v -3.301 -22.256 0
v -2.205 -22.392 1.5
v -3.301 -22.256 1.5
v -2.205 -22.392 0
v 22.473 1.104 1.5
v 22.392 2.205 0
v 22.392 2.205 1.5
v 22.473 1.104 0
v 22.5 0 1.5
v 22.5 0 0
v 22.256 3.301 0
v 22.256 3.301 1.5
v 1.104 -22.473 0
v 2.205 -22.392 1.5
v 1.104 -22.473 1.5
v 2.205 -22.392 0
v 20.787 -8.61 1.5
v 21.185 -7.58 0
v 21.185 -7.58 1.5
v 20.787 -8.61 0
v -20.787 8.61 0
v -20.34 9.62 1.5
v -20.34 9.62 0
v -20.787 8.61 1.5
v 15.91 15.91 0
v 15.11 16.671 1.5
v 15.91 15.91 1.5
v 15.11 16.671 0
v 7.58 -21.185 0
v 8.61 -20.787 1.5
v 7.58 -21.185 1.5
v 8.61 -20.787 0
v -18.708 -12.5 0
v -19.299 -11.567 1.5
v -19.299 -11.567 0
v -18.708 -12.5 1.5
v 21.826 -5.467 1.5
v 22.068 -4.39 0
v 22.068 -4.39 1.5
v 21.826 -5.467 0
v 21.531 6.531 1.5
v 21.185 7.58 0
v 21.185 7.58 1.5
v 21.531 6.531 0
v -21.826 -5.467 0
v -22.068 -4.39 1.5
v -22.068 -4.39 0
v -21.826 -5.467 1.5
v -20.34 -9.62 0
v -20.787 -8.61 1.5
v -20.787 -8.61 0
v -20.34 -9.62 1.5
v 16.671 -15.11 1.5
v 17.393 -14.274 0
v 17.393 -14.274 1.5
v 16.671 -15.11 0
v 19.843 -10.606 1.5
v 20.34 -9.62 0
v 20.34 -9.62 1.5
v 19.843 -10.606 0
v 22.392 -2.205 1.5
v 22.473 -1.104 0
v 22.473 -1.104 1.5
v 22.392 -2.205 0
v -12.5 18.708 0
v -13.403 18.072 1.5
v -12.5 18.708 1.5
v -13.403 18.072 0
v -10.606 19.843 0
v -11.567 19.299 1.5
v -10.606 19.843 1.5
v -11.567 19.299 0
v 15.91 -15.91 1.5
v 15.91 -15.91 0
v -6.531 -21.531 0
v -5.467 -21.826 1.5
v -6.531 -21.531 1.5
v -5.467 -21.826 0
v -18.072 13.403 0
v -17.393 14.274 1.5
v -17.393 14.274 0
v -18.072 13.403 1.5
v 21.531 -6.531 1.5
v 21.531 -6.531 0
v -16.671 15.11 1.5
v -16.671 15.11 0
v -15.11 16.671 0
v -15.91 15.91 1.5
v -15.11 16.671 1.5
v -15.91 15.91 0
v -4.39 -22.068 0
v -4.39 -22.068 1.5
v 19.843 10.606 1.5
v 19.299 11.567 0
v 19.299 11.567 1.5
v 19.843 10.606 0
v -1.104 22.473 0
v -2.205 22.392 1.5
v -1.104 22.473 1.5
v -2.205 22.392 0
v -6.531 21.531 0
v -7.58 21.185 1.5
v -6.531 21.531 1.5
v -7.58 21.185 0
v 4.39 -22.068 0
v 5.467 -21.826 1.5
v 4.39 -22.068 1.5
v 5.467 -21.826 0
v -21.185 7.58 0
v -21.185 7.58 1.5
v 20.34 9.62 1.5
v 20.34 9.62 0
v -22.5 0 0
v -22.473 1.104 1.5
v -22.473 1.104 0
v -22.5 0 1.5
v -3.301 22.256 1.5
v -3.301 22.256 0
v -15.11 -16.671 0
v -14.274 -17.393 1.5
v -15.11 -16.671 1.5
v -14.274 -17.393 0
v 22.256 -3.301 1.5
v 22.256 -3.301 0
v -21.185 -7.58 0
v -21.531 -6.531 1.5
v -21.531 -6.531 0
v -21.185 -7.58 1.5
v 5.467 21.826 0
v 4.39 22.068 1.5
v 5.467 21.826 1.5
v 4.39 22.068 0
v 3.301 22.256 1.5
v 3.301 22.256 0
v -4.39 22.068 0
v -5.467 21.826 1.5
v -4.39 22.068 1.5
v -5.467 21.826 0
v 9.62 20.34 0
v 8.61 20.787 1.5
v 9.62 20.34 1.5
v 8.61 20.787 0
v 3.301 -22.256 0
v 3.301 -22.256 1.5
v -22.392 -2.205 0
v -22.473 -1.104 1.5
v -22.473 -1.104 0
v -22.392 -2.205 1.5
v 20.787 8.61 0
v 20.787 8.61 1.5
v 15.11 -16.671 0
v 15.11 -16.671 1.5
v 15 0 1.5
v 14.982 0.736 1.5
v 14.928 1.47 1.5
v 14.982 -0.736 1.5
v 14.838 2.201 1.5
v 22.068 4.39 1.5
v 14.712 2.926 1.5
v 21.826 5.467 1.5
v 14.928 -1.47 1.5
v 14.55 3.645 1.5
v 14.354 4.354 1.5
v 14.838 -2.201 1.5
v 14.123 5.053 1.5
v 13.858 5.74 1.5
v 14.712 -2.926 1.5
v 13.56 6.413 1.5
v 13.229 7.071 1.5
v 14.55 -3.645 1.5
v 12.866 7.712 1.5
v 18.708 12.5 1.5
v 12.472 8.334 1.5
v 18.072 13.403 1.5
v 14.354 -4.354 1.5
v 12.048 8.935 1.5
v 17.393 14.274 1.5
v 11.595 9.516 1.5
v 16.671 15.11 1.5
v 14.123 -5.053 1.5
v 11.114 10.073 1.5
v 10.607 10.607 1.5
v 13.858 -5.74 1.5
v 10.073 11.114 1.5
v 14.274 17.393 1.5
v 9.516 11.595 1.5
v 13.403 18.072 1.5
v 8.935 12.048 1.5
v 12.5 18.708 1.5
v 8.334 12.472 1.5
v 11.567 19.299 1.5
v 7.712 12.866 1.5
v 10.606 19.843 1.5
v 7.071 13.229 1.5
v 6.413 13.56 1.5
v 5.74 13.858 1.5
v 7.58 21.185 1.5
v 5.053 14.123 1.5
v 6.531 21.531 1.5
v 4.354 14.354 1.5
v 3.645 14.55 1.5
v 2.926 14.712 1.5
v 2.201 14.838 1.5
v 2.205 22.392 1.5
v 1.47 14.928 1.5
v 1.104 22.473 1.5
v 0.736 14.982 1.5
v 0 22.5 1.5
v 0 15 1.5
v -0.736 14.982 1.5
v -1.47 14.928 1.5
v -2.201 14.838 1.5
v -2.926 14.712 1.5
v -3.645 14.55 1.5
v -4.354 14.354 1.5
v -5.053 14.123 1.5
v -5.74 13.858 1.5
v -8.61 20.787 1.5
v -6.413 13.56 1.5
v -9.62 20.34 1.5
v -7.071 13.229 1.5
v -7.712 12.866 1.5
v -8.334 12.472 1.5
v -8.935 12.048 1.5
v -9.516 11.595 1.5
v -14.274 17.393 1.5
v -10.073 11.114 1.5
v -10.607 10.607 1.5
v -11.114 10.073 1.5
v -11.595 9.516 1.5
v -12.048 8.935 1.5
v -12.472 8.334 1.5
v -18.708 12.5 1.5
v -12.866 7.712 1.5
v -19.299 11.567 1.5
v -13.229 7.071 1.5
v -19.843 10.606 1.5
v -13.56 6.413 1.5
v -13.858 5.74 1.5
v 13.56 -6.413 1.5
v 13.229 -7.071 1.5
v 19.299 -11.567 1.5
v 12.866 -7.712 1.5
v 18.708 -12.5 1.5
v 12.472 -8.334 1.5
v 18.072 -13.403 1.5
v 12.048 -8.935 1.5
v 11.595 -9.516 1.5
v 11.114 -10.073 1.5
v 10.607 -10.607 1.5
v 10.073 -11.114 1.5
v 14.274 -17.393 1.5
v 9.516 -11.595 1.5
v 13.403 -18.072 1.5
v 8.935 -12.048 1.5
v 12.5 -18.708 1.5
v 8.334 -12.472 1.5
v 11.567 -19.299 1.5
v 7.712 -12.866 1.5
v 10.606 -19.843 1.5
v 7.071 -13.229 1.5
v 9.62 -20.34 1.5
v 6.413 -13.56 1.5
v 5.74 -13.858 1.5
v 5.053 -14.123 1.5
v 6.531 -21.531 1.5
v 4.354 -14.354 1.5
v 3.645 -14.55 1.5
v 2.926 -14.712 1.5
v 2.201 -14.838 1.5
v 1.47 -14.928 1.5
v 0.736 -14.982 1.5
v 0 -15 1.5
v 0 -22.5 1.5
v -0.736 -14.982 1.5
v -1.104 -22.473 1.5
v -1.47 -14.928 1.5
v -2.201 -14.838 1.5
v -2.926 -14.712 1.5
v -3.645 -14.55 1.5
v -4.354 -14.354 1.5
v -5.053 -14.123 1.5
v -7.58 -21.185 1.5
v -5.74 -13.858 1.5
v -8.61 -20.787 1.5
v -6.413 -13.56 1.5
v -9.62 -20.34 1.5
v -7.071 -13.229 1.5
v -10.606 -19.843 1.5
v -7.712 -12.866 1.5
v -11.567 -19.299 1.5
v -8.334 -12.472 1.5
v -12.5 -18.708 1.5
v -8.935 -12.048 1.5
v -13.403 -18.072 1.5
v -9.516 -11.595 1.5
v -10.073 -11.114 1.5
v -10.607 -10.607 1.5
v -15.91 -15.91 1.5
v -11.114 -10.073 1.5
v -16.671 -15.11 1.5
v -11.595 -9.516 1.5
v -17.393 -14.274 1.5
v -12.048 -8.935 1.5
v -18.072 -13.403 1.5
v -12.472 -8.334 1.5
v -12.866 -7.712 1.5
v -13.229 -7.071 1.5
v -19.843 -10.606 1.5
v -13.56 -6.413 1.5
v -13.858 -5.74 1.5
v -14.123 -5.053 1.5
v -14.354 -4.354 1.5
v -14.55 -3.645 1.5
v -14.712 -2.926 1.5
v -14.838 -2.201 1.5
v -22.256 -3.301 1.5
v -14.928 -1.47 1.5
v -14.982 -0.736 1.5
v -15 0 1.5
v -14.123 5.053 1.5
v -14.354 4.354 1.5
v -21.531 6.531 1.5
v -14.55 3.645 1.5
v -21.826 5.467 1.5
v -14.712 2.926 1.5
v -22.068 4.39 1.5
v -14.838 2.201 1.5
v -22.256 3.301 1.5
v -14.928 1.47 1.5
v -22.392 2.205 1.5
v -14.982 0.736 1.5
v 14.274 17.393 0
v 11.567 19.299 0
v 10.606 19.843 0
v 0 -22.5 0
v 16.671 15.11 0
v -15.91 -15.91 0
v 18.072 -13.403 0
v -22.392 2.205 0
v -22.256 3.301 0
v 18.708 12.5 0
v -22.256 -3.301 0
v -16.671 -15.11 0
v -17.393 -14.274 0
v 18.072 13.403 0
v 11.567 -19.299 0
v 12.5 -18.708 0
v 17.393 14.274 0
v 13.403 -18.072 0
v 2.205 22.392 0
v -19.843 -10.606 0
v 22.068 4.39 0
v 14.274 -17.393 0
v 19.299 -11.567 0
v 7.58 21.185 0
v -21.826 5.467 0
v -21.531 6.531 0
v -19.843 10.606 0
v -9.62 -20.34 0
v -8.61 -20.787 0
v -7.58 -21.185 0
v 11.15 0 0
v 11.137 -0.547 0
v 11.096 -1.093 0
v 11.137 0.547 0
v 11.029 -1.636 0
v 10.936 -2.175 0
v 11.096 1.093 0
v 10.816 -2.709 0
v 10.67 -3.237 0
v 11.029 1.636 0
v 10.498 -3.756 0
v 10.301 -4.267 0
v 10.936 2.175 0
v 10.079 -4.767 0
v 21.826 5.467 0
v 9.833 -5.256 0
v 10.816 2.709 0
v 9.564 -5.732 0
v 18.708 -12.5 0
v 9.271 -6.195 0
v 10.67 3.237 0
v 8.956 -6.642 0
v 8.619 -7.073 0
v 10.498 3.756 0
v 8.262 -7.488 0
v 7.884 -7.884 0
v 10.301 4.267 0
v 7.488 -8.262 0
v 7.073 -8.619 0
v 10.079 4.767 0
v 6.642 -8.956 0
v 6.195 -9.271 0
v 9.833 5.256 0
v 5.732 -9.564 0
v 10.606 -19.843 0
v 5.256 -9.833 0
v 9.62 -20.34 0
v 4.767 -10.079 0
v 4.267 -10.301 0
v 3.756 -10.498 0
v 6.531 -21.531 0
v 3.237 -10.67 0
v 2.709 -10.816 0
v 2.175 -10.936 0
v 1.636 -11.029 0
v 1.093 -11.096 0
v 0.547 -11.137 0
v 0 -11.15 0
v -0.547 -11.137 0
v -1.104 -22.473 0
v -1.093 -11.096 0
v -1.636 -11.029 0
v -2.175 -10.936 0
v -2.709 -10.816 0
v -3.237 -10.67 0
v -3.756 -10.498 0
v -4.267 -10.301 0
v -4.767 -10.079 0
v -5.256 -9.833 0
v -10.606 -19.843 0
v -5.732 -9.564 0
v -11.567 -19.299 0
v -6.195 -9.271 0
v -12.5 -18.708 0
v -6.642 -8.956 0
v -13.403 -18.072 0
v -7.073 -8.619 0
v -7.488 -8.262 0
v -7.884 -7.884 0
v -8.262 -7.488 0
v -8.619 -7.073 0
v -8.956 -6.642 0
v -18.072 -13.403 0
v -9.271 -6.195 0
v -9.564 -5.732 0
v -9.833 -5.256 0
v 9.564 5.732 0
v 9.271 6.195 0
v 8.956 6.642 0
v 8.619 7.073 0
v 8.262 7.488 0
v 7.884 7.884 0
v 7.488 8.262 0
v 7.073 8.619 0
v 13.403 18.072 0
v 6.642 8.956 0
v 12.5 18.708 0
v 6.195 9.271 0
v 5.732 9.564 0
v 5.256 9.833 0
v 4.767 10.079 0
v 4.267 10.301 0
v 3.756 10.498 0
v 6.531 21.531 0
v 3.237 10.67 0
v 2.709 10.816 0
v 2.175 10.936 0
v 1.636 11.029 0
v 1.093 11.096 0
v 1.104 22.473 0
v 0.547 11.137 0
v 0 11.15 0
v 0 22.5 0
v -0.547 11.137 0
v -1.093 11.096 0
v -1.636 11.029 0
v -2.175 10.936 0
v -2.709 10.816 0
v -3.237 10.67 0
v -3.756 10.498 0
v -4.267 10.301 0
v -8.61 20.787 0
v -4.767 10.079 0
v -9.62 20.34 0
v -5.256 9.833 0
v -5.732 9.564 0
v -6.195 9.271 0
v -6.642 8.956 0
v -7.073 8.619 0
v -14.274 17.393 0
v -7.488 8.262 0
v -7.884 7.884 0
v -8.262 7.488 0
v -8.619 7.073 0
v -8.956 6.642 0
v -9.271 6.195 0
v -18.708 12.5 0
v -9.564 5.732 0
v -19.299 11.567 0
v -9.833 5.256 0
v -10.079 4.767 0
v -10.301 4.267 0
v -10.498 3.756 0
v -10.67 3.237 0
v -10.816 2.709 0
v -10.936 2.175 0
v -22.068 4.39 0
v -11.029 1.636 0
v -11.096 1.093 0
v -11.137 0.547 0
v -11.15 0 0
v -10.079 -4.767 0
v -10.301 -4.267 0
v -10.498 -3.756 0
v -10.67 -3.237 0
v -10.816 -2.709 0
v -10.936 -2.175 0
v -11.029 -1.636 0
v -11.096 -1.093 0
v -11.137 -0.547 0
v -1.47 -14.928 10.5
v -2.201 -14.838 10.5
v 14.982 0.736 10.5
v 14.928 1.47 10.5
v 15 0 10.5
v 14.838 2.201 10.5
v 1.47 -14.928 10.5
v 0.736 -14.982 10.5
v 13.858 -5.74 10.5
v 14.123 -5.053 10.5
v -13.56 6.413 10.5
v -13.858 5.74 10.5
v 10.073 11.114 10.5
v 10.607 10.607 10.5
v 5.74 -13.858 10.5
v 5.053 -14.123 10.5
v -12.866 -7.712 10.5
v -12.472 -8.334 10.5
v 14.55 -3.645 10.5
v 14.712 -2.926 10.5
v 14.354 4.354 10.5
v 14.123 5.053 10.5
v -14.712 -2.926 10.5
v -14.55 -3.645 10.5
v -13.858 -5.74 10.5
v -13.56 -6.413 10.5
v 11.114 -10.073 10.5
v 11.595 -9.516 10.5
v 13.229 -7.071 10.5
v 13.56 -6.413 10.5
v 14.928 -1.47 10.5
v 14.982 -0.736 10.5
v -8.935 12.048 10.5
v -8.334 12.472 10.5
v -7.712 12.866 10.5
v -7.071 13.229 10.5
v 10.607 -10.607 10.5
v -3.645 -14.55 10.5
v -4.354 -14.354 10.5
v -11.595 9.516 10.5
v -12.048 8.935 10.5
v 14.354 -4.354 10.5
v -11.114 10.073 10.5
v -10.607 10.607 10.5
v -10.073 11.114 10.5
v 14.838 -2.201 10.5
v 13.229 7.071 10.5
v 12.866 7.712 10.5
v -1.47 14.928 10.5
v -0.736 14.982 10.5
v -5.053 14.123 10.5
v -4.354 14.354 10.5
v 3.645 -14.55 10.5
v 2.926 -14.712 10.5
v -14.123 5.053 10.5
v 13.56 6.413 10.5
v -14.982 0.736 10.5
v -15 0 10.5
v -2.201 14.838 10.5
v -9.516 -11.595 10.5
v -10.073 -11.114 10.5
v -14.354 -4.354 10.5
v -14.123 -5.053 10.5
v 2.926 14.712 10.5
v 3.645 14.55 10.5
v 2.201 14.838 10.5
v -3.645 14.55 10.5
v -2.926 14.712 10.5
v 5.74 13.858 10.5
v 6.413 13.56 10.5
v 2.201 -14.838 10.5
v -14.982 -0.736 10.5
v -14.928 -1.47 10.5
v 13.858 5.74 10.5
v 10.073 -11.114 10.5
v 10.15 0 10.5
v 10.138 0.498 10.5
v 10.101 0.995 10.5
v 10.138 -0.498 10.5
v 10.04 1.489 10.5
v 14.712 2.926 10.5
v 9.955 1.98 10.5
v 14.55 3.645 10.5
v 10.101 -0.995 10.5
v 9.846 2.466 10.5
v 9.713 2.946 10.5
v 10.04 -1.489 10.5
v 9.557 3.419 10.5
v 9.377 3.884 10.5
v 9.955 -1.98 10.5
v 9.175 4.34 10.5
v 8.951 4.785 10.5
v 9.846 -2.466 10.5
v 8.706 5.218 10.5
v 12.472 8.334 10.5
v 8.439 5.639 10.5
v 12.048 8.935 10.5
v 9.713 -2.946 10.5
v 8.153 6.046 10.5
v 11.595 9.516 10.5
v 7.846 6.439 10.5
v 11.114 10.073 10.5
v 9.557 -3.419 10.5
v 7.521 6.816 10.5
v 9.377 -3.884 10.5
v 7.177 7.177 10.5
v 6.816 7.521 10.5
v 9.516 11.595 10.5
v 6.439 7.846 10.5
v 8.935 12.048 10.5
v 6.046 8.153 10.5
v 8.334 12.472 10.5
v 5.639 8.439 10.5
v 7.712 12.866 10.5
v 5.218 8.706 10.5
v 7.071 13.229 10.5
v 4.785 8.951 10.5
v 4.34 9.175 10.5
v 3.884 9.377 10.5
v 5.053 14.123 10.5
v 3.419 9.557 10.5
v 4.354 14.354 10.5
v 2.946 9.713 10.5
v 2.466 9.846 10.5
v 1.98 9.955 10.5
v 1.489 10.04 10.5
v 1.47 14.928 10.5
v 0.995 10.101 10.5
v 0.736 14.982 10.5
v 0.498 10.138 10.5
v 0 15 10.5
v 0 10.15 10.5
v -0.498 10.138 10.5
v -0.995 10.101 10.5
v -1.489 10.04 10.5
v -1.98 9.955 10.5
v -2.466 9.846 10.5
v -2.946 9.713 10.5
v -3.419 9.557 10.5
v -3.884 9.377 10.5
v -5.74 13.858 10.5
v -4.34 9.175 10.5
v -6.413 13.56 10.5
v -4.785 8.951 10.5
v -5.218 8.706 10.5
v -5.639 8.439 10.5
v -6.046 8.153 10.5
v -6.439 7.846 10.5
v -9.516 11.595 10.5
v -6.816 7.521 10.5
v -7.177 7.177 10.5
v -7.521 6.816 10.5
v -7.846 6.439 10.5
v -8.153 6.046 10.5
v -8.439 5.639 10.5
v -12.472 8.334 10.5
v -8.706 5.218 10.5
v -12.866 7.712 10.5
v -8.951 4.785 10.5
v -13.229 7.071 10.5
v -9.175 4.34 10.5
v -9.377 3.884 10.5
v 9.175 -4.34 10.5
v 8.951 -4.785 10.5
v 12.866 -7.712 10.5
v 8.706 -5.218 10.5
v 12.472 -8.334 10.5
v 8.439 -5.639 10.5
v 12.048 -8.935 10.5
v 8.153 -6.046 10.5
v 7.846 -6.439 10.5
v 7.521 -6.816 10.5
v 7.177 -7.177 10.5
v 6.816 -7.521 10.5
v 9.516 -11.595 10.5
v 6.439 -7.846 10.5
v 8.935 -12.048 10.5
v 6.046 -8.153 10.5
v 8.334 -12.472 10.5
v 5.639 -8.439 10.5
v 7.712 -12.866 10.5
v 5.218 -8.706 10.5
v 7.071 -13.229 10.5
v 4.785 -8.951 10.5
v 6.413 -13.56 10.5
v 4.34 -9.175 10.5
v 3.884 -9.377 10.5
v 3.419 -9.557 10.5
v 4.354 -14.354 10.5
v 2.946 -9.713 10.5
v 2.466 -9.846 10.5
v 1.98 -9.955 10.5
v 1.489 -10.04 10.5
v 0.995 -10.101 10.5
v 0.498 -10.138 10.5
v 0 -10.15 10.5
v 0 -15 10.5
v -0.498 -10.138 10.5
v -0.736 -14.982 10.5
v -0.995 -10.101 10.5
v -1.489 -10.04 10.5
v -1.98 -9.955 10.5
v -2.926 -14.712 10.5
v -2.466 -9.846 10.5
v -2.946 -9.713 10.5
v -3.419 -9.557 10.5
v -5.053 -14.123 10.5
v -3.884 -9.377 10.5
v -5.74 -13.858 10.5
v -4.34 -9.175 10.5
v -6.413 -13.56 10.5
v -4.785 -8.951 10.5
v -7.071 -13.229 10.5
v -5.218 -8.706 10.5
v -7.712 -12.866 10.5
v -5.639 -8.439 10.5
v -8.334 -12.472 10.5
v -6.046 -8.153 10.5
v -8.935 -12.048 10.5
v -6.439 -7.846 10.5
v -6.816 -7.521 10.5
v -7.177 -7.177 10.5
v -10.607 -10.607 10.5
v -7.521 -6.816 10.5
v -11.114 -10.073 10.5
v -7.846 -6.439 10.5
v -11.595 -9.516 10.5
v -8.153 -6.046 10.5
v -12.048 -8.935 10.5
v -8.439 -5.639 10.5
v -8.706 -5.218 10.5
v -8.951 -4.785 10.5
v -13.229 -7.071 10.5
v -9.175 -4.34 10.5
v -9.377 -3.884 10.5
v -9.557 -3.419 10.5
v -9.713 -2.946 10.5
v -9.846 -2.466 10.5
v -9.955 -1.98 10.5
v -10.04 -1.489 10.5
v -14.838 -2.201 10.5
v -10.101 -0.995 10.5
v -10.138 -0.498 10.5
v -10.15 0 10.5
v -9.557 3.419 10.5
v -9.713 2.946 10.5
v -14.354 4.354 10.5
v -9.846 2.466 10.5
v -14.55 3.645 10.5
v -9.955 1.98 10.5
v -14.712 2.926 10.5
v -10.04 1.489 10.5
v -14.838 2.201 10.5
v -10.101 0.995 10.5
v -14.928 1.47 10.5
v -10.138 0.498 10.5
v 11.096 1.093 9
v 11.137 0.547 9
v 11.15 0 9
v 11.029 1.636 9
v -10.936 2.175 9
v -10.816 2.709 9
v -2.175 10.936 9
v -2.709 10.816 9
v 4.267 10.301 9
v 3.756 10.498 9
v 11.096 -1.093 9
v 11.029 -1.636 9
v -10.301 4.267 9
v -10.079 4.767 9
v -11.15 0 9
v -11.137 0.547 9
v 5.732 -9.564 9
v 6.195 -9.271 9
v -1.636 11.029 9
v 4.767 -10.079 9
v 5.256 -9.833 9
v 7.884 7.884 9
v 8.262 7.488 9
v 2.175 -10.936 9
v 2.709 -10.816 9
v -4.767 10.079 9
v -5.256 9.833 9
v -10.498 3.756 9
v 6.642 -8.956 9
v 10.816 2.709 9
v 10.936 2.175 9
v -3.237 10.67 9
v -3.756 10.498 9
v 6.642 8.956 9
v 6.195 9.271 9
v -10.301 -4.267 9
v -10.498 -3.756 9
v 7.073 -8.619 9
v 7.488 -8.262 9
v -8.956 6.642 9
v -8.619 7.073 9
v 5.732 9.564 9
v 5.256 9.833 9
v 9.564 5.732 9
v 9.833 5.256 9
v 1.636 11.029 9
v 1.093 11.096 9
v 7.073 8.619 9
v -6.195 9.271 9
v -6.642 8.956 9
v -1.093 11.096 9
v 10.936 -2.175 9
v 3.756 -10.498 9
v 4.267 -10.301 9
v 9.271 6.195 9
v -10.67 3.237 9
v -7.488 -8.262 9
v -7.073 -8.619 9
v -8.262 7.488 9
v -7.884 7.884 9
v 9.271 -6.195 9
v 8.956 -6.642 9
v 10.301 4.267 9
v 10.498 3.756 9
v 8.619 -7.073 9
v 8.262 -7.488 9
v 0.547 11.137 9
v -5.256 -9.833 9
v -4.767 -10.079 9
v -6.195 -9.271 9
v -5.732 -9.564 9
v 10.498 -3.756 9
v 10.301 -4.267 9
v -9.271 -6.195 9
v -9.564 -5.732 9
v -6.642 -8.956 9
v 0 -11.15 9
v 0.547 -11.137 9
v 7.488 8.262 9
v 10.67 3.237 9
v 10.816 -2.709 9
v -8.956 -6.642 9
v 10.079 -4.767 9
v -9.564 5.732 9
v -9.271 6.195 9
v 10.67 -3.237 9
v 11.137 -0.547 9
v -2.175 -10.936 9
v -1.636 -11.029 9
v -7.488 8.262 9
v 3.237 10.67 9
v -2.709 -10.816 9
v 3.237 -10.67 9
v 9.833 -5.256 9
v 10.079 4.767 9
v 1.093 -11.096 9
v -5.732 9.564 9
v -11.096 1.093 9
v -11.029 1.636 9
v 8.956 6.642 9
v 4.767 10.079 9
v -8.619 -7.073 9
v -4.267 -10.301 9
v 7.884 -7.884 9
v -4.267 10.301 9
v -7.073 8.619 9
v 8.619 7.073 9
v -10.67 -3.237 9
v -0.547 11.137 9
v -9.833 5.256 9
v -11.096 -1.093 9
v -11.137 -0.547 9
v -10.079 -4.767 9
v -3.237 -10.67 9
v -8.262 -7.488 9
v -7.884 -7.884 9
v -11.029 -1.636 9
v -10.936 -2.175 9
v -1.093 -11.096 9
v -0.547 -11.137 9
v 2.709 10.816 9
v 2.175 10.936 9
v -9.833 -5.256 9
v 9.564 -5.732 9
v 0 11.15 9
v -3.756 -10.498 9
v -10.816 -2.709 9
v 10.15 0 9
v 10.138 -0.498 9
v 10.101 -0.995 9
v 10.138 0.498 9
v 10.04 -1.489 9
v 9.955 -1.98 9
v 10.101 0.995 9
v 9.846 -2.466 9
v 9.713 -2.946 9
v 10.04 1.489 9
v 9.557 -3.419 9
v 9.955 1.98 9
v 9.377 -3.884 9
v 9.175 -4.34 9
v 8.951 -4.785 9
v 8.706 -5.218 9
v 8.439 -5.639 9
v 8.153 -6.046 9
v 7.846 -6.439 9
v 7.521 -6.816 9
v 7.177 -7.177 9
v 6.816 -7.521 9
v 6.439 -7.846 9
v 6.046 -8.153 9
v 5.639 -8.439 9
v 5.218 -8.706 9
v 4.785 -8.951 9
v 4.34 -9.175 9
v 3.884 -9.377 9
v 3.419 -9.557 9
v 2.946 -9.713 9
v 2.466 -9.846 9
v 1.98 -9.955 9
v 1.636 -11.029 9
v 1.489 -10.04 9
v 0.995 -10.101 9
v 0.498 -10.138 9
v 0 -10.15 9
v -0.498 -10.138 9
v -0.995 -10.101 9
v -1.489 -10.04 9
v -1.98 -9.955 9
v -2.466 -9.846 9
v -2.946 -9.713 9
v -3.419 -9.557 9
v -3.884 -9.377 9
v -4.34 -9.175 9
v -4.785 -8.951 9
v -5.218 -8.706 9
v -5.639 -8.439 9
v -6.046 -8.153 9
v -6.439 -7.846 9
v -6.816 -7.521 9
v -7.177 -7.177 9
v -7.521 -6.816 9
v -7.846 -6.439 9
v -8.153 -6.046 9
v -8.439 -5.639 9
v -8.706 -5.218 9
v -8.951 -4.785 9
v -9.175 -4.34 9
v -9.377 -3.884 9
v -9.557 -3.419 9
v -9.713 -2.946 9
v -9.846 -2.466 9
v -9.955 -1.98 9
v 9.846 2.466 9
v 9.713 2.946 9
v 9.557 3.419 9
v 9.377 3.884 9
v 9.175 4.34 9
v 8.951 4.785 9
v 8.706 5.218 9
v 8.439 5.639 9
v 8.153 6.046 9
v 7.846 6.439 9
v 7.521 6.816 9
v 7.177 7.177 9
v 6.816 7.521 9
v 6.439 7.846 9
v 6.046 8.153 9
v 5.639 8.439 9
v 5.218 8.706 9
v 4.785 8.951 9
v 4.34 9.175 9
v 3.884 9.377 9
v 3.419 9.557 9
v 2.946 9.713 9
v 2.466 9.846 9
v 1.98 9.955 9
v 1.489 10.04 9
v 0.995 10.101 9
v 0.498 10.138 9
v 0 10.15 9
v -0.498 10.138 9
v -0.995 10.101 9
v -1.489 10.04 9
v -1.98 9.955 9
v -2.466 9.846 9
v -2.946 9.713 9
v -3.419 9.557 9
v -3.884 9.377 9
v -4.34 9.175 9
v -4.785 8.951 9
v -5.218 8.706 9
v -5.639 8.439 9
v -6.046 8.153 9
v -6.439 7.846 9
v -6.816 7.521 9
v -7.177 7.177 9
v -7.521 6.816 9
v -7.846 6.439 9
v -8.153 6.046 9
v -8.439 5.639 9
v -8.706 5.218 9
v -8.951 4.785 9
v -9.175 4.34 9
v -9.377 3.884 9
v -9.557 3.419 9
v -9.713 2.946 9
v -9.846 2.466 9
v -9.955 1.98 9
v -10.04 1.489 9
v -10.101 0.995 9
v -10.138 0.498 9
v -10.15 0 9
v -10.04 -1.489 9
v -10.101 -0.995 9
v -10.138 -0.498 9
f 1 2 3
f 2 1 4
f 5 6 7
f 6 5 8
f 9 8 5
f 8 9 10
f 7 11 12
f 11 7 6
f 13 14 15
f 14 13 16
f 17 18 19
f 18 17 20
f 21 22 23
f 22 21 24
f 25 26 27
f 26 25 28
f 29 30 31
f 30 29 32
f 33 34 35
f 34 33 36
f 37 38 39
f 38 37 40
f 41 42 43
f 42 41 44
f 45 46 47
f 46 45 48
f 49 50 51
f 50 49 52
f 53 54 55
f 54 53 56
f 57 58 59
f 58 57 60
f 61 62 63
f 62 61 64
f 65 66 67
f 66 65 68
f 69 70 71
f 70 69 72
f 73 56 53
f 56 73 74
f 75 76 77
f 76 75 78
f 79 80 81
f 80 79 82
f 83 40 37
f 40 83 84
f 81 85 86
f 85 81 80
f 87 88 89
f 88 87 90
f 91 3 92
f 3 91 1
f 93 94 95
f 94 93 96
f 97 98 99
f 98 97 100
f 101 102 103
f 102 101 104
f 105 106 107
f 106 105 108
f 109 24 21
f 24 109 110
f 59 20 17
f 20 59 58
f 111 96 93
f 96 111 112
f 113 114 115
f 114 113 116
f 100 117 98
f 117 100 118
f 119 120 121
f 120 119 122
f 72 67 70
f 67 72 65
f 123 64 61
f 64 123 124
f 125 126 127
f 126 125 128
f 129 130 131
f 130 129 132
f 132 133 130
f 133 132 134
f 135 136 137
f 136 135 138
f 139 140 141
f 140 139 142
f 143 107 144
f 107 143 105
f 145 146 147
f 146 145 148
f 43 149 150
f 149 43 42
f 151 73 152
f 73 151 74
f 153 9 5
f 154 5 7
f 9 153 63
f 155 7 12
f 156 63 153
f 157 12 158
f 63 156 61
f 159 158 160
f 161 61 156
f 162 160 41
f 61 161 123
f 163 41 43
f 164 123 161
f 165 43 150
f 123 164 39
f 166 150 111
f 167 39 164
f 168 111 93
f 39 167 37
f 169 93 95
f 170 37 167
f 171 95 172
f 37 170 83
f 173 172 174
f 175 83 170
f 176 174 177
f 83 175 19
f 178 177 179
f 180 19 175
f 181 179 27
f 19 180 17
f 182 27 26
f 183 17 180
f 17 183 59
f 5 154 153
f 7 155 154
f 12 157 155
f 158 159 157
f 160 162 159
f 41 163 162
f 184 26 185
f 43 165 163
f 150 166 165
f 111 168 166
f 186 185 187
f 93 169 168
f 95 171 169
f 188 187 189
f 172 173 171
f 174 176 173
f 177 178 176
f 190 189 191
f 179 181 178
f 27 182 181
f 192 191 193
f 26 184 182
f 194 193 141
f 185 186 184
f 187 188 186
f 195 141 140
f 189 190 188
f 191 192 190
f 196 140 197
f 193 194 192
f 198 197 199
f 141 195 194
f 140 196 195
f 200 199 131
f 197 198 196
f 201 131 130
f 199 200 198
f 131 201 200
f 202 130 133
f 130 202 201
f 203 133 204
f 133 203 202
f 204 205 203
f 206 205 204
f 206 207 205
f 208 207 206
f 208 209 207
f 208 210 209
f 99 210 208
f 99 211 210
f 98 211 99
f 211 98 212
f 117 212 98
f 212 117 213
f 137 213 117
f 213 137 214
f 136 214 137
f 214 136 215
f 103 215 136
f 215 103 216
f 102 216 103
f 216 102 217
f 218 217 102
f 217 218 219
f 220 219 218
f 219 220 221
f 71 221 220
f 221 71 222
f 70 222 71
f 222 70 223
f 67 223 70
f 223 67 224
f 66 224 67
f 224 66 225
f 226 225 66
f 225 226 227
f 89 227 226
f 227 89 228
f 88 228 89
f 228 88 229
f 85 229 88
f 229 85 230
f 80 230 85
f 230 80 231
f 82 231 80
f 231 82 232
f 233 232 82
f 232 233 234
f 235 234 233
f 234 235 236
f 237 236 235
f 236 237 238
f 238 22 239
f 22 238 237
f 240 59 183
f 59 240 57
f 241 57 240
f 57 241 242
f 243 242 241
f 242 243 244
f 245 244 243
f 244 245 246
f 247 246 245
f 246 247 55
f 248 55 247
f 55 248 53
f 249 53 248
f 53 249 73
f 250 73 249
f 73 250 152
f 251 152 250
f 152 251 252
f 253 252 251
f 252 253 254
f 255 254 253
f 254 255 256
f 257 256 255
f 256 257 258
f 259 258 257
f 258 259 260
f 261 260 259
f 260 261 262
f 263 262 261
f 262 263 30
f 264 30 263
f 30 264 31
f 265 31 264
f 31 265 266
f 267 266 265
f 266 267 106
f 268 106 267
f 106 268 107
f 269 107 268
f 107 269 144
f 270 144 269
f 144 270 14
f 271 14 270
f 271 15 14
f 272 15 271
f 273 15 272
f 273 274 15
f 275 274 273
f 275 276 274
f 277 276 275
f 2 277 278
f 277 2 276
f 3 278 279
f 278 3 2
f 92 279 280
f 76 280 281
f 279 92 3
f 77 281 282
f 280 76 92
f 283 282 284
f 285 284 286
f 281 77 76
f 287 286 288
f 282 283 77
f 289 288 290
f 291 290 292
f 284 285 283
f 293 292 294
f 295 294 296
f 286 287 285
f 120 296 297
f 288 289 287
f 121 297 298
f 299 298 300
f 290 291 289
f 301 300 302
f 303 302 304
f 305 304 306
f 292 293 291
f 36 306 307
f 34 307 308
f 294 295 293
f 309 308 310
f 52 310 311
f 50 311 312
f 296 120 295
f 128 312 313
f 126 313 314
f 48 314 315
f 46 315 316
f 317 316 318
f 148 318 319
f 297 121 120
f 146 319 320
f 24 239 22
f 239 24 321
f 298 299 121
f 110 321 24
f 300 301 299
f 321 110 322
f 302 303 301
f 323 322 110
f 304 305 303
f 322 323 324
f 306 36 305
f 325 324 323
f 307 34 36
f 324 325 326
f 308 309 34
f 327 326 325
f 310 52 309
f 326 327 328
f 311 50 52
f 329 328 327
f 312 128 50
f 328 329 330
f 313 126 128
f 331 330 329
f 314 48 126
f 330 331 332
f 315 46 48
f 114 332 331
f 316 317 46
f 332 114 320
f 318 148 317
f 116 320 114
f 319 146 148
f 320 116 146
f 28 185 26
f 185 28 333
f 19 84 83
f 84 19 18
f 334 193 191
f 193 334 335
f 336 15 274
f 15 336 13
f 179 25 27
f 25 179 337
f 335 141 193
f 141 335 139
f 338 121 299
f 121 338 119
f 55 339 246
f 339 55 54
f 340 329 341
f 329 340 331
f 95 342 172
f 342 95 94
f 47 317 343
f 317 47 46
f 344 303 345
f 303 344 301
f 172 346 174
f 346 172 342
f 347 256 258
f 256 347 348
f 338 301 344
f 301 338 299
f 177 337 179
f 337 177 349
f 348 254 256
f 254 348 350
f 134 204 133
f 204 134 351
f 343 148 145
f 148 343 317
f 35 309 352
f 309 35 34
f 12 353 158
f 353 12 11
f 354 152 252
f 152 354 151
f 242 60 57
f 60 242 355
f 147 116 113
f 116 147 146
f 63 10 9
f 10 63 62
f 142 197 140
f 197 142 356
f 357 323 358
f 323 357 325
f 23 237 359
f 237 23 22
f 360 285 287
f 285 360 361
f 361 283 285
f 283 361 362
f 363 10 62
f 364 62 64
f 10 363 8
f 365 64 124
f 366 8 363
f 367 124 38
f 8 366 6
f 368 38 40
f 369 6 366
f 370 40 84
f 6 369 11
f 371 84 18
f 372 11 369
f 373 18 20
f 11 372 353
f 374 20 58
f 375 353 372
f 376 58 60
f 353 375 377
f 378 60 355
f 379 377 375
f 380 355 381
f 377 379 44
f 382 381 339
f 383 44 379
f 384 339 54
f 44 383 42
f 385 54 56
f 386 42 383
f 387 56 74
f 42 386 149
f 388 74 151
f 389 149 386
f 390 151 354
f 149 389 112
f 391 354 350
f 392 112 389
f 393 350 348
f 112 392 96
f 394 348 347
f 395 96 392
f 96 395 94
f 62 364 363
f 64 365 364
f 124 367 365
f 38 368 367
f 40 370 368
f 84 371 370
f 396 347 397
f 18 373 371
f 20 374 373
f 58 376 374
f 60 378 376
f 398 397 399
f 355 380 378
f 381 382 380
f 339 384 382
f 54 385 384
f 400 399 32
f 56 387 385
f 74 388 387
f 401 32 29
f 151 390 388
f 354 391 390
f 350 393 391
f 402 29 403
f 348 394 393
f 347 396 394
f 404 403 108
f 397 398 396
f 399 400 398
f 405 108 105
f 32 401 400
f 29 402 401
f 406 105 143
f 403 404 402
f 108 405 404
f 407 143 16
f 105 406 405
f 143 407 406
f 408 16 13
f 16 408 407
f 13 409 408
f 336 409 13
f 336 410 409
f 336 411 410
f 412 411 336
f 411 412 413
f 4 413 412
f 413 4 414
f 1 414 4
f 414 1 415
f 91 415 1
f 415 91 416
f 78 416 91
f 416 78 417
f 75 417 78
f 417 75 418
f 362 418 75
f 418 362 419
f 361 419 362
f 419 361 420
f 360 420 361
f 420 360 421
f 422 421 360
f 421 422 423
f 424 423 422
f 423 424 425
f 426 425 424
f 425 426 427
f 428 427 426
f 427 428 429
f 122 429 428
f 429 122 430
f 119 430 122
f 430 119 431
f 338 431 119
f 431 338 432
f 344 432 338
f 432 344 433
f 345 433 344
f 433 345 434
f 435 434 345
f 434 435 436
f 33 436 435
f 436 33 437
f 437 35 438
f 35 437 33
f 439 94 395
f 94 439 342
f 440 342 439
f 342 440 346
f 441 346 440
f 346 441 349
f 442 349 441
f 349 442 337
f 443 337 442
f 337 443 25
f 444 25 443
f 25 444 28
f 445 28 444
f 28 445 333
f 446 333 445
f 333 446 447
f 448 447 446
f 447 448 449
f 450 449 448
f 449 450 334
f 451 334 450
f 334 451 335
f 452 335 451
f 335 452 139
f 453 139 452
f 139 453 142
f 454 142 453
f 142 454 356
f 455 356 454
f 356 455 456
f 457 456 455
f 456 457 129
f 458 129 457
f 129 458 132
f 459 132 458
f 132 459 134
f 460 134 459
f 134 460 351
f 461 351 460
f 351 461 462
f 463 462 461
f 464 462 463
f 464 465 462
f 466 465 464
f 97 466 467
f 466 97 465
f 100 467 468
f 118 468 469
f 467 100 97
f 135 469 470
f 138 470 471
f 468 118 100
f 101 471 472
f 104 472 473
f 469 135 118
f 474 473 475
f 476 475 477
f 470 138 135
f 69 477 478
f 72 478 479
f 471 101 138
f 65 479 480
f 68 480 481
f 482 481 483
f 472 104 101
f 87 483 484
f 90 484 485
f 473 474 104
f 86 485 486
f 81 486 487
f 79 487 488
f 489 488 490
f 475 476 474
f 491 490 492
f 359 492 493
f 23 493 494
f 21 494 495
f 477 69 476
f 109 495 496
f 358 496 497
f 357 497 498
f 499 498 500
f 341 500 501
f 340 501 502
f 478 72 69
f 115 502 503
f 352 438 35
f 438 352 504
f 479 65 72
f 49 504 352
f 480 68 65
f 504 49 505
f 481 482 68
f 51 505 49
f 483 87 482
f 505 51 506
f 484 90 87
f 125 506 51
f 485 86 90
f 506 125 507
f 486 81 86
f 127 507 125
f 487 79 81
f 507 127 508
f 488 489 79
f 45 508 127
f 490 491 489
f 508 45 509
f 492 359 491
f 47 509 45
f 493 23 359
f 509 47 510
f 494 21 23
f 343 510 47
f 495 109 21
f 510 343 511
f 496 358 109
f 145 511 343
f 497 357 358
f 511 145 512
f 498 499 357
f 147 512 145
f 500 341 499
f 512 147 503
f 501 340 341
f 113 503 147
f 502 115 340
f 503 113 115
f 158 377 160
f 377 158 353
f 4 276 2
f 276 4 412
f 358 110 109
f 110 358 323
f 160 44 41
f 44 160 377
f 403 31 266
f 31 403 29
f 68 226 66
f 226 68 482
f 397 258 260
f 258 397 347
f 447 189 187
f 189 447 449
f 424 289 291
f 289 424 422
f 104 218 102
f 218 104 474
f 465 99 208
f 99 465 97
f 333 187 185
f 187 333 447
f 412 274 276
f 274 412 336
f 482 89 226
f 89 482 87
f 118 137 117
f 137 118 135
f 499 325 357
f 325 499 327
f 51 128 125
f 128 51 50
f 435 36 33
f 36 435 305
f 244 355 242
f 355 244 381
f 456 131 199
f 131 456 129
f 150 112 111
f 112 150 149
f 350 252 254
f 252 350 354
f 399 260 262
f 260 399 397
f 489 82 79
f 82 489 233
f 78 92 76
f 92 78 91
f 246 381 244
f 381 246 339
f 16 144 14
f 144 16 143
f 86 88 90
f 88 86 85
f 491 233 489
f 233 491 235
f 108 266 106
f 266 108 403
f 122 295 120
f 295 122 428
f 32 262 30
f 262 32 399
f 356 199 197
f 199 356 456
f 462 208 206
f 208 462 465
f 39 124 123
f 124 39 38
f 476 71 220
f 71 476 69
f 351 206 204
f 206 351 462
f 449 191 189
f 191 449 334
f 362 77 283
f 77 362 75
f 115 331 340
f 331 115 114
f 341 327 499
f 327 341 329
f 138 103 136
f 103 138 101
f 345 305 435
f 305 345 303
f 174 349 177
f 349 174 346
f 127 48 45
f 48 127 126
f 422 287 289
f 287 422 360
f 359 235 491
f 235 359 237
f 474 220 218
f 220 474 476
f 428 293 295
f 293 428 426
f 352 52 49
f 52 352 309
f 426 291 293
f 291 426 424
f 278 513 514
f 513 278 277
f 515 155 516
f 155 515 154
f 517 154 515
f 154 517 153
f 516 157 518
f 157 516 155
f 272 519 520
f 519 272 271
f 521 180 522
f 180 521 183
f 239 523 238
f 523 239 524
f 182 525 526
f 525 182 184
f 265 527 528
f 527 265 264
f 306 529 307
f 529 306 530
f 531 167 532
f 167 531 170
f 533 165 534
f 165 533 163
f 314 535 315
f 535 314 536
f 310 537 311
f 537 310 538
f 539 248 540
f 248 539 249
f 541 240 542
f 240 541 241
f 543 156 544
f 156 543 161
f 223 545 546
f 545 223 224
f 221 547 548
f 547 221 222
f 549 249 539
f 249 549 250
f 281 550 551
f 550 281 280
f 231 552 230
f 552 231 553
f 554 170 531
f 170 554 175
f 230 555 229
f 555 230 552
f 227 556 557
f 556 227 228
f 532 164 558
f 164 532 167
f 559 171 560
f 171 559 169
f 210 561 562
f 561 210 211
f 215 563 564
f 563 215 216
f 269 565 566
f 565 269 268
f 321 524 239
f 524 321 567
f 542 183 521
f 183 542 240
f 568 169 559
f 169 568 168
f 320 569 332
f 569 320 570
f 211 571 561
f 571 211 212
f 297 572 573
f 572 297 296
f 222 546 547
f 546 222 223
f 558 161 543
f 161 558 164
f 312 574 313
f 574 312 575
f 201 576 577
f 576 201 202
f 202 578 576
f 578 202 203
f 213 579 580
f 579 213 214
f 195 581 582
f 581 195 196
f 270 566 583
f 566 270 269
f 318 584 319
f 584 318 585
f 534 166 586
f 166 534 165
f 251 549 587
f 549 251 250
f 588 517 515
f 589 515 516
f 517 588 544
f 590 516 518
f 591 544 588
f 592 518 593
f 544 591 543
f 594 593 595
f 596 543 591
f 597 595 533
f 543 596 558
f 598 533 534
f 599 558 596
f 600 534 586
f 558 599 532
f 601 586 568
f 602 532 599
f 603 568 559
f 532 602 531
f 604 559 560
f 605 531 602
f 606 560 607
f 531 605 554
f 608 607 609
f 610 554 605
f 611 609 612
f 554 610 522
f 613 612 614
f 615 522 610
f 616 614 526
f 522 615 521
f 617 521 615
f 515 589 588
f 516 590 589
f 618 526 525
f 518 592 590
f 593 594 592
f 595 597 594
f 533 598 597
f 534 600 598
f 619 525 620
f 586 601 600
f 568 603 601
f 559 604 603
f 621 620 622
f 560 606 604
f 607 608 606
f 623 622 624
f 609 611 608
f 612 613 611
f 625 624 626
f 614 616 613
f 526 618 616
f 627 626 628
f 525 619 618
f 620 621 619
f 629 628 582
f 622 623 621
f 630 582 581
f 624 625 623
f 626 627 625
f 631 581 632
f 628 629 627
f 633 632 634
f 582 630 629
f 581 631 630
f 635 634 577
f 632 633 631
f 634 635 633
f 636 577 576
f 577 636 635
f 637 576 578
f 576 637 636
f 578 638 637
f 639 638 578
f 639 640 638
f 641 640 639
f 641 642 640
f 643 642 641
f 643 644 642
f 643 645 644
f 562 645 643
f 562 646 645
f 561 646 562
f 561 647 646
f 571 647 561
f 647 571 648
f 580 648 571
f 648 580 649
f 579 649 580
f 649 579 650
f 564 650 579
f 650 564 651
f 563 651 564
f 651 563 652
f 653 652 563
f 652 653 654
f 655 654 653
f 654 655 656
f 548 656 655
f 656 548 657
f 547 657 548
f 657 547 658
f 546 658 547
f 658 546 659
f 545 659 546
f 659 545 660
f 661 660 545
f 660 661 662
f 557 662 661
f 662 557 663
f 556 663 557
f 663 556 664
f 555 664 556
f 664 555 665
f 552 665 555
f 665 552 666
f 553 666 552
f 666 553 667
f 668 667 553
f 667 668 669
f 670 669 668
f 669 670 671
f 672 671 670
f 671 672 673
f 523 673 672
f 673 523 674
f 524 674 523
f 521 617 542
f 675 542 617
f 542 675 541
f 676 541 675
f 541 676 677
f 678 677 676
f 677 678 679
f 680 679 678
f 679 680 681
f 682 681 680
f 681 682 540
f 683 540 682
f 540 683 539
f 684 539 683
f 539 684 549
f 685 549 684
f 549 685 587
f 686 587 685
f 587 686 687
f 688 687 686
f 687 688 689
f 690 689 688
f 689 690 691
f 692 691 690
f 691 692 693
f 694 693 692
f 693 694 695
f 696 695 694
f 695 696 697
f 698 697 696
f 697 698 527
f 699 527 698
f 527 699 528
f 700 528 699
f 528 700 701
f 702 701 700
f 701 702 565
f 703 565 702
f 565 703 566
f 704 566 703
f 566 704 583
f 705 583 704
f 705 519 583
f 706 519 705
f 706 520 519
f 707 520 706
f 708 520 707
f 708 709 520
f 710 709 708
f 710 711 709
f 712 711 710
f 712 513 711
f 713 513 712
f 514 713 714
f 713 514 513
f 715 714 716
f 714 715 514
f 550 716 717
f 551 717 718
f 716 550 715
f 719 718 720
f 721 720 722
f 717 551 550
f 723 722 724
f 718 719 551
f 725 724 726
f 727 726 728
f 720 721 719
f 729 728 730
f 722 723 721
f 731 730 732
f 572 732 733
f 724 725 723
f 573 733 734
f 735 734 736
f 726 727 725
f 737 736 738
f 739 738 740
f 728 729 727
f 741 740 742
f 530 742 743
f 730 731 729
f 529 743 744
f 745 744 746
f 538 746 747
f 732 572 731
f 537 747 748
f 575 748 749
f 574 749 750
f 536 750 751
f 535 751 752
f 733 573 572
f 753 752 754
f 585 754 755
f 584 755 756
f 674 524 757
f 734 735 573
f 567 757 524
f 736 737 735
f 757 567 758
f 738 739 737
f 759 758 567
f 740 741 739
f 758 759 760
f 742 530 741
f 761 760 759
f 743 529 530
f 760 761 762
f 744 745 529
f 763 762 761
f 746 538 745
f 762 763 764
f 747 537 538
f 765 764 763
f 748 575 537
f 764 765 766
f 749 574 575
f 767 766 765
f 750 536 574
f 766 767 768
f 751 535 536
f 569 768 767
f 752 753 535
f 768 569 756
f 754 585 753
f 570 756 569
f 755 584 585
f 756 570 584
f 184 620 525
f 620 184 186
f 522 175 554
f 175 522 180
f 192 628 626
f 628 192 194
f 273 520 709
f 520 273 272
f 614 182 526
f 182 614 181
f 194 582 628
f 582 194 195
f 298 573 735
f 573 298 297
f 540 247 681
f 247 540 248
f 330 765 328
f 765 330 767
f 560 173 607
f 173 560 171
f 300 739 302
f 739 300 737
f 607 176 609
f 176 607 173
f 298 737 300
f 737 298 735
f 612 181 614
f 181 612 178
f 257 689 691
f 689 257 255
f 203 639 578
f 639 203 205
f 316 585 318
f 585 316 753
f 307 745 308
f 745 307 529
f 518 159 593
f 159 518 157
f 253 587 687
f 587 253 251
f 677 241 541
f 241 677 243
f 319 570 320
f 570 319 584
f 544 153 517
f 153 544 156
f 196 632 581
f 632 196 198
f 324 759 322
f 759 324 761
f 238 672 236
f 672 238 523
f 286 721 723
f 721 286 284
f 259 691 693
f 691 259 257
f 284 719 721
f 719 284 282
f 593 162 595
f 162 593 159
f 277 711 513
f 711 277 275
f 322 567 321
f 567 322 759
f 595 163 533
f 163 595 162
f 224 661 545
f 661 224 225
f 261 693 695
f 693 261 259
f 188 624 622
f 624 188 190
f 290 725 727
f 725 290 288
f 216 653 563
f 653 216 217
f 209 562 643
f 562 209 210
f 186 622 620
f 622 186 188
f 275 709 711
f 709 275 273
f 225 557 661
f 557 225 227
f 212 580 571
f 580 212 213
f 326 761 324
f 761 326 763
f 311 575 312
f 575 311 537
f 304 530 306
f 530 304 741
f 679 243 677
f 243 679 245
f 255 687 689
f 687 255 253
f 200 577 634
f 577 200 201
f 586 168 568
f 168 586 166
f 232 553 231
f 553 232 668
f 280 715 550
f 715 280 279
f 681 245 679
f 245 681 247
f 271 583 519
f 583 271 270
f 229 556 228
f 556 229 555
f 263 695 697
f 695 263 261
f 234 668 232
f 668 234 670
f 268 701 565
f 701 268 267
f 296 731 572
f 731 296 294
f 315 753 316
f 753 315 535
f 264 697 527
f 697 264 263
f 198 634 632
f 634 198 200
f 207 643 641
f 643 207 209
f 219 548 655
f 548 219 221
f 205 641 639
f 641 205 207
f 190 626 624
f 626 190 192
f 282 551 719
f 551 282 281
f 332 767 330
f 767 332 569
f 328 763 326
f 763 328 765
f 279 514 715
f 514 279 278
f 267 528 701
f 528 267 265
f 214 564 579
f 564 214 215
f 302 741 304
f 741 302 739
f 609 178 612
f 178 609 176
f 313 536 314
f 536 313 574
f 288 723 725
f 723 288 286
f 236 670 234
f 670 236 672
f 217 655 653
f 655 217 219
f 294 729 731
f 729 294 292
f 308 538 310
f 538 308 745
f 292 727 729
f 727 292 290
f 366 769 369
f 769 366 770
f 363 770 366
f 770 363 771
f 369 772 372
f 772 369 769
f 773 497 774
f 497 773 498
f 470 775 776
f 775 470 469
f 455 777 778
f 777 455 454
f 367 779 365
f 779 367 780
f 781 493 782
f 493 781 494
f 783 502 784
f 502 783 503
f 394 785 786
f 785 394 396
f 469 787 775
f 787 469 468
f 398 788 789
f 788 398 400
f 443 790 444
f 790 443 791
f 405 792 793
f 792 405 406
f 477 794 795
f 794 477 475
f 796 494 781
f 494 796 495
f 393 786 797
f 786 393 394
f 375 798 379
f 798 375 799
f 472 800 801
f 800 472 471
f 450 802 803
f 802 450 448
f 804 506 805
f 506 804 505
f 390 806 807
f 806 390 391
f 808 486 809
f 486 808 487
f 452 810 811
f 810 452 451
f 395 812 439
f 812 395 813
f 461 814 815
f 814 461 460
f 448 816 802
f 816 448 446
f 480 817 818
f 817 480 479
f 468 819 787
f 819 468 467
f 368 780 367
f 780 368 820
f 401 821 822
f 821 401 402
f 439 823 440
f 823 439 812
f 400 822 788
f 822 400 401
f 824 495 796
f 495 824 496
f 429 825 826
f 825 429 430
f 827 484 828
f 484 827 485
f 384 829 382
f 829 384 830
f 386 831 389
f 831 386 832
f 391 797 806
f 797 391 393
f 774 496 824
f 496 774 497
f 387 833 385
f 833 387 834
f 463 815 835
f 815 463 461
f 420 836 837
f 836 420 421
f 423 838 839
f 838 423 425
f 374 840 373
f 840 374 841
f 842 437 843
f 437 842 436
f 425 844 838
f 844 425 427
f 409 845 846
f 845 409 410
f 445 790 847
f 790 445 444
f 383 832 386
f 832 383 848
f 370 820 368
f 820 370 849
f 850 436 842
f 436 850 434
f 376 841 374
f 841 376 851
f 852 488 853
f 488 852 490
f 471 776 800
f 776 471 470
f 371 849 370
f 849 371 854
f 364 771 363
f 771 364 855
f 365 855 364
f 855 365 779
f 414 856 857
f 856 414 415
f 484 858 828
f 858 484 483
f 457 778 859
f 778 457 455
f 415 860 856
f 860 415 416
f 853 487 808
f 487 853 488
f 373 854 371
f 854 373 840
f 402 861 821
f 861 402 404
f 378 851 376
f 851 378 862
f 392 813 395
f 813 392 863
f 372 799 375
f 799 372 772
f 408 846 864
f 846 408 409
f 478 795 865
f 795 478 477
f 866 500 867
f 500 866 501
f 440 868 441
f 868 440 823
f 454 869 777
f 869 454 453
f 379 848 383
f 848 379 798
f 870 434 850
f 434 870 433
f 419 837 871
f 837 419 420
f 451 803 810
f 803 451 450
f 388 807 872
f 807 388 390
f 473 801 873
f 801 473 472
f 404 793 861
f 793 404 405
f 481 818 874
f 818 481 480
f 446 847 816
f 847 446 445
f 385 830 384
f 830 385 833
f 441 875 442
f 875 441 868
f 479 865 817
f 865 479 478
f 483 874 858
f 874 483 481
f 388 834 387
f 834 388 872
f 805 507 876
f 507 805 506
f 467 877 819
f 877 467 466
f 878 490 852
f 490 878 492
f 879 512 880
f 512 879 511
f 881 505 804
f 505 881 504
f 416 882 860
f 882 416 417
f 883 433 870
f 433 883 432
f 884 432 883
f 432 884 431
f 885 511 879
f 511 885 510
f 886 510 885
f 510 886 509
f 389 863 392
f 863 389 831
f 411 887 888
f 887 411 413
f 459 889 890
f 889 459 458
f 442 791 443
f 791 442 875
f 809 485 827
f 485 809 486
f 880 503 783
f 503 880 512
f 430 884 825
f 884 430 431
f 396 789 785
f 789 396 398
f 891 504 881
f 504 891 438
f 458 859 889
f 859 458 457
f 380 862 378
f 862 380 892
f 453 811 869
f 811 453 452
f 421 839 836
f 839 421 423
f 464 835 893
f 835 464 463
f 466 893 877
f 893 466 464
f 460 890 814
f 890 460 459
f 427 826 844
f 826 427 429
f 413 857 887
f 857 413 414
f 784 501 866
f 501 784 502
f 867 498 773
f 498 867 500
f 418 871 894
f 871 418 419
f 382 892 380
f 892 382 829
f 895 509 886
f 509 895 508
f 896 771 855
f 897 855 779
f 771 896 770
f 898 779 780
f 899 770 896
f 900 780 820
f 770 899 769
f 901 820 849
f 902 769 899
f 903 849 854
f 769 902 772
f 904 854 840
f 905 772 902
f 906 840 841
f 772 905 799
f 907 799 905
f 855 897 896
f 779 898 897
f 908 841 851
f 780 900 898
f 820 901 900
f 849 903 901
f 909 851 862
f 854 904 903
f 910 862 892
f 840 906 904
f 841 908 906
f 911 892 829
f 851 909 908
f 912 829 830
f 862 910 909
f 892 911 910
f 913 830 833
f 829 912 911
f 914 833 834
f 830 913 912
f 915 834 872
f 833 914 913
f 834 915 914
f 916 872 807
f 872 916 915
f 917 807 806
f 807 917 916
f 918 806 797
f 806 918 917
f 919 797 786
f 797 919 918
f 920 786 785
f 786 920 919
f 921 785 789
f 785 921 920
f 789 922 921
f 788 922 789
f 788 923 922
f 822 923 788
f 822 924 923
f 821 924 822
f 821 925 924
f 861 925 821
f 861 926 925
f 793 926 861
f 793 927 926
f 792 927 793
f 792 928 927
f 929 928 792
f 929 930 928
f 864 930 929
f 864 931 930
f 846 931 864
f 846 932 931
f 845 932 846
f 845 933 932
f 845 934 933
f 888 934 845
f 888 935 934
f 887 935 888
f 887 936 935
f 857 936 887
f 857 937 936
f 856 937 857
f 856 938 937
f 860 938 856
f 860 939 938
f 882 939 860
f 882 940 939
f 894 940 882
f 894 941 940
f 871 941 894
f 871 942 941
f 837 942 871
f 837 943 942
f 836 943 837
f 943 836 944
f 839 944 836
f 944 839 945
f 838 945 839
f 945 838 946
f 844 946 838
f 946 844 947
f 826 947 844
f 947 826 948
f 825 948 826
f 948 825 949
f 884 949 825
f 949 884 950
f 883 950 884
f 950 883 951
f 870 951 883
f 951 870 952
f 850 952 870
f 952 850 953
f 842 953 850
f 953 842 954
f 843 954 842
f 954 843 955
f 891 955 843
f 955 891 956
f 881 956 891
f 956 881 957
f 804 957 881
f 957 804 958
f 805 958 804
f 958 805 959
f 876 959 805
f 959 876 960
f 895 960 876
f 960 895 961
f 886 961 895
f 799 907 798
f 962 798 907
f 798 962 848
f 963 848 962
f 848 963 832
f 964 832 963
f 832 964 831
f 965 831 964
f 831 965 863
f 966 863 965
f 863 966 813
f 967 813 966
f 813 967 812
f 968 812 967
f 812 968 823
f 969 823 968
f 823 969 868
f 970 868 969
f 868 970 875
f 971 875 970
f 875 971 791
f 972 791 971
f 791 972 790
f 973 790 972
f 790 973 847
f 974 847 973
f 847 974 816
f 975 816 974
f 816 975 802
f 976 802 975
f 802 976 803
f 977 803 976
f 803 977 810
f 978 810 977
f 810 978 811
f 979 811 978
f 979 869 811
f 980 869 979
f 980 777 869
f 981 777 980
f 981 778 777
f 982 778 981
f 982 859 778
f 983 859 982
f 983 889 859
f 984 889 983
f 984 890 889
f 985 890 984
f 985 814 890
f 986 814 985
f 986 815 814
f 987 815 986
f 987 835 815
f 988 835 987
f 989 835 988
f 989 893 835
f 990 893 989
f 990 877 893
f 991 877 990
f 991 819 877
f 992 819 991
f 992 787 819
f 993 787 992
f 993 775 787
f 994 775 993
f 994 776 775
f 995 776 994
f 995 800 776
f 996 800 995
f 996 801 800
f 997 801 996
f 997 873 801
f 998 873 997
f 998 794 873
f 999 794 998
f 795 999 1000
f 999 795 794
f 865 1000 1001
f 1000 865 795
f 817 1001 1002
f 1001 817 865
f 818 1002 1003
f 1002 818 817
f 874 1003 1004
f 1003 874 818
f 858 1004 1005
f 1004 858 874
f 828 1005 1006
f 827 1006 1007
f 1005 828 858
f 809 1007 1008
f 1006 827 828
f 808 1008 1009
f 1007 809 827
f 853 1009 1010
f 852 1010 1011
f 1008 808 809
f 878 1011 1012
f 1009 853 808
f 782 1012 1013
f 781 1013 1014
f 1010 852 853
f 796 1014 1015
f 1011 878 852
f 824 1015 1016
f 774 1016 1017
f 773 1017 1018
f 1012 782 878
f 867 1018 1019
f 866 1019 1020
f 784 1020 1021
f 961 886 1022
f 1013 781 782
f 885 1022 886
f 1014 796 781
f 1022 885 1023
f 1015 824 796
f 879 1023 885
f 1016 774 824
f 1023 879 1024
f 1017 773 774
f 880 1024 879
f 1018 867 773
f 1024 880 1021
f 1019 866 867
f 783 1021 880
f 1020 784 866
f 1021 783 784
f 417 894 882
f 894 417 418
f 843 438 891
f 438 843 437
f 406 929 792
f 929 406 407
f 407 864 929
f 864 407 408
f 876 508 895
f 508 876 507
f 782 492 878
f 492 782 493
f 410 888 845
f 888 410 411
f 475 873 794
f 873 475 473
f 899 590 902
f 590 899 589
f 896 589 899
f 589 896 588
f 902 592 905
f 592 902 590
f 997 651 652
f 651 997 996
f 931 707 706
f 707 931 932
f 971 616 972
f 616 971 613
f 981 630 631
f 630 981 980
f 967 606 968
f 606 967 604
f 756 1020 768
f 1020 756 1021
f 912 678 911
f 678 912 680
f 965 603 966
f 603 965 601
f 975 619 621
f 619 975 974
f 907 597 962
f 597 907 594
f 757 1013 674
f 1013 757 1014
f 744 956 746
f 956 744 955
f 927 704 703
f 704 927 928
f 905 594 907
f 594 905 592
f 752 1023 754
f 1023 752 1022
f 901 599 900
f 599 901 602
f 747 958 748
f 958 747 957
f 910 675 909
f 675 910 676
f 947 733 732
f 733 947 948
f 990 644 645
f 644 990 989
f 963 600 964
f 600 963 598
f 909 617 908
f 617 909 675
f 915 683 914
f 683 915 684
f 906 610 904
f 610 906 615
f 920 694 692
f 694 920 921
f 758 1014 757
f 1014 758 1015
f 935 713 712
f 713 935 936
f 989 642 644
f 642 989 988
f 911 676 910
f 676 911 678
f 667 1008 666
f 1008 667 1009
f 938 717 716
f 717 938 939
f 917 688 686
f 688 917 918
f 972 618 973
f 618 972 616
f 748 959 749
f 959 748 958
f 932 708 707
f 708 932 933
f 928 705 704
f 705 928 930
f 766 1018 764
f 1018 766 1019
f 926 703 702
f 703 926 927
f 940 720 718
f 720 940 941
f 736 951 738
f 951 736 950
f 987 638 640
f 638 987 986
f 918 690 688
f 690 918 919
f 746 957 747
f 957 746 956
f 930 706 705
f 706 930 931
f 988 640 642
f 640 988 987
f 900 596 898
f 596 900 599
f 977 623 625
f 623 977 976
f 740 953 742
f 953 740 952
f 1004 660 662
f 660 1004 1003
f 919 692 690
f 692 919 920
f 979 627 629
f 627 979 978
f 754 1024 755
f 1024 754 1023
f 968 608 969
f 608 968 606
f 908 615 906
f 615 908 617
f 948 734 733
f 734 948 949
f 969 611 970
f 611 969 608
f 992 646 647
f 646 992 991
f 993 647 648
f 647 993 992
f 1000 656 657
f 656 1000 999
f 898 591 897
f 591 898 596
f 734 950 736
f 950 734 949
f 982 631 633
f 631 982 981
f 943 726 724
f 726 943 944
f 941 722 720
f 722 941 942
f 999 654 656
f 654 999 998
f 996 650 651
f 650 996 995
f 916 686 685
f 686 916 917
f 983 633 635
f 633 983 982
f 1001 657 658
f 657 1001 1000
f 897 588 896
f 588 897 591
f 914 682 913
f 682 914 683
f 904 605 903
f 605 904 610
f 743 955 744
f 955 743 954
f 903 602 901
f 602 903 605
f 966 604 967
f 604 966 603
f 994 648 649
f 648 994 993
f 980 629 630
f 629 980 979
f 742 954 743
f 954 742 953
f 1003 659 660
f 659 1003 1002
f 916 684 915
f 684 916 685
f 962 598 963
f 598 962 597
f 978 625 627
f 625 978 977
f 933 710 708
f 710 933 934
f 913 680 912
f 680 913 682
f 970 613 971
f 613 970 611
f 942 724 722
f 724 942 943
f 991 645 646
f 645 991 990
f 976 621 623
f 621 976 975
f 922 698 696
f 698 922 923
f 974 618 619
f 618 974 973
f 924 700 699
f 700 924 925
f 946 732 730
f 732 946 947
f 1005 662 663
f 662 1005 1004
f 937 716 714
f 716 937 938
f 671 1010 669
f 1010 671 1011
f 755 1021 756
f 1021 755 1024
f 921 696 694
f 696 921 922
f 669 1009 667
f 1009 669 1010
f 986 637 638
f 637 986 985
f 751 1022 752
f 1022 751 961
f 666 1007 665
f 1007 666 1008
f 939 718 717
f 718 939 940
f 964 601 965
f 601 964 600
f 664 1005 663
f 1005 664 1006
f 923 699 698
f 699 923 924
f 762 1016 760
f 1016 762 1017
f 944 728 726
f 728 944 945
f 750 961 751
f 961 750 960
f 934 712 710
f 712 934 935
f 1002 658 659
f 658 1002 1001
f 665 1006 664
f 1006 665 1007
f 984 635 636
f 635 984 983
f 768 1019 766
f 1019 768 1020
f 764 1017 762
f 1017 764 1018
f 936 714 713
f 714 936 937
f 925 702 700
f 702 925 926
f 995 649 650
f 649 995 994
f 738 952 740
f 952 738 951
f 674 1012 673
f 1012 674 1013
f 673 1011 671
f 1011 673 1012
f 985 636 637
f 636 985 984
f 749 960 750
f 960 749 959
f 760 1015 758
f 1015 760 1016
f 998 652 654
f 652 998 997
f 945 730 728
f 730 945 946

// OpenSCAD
module spool_rondelle() {
  $fn=128;
  disque=45;
  droulement=22.3;
  dext=30;
  eroulement=9;
  ep=1.5;
  
  echo ("spool_rondelle");

  difference(){
    union(){
      cylinder(h=ep,d=disque);
      cylinder(h=eroulement+ep, d=dext);
    }
    translate([0,0,-1]) cylinder(h=eroulement+1, d=droulement);
    cylinder(h=eroulement+ep+1, d=droulement-2);
  }
}

spool_rondelle();
